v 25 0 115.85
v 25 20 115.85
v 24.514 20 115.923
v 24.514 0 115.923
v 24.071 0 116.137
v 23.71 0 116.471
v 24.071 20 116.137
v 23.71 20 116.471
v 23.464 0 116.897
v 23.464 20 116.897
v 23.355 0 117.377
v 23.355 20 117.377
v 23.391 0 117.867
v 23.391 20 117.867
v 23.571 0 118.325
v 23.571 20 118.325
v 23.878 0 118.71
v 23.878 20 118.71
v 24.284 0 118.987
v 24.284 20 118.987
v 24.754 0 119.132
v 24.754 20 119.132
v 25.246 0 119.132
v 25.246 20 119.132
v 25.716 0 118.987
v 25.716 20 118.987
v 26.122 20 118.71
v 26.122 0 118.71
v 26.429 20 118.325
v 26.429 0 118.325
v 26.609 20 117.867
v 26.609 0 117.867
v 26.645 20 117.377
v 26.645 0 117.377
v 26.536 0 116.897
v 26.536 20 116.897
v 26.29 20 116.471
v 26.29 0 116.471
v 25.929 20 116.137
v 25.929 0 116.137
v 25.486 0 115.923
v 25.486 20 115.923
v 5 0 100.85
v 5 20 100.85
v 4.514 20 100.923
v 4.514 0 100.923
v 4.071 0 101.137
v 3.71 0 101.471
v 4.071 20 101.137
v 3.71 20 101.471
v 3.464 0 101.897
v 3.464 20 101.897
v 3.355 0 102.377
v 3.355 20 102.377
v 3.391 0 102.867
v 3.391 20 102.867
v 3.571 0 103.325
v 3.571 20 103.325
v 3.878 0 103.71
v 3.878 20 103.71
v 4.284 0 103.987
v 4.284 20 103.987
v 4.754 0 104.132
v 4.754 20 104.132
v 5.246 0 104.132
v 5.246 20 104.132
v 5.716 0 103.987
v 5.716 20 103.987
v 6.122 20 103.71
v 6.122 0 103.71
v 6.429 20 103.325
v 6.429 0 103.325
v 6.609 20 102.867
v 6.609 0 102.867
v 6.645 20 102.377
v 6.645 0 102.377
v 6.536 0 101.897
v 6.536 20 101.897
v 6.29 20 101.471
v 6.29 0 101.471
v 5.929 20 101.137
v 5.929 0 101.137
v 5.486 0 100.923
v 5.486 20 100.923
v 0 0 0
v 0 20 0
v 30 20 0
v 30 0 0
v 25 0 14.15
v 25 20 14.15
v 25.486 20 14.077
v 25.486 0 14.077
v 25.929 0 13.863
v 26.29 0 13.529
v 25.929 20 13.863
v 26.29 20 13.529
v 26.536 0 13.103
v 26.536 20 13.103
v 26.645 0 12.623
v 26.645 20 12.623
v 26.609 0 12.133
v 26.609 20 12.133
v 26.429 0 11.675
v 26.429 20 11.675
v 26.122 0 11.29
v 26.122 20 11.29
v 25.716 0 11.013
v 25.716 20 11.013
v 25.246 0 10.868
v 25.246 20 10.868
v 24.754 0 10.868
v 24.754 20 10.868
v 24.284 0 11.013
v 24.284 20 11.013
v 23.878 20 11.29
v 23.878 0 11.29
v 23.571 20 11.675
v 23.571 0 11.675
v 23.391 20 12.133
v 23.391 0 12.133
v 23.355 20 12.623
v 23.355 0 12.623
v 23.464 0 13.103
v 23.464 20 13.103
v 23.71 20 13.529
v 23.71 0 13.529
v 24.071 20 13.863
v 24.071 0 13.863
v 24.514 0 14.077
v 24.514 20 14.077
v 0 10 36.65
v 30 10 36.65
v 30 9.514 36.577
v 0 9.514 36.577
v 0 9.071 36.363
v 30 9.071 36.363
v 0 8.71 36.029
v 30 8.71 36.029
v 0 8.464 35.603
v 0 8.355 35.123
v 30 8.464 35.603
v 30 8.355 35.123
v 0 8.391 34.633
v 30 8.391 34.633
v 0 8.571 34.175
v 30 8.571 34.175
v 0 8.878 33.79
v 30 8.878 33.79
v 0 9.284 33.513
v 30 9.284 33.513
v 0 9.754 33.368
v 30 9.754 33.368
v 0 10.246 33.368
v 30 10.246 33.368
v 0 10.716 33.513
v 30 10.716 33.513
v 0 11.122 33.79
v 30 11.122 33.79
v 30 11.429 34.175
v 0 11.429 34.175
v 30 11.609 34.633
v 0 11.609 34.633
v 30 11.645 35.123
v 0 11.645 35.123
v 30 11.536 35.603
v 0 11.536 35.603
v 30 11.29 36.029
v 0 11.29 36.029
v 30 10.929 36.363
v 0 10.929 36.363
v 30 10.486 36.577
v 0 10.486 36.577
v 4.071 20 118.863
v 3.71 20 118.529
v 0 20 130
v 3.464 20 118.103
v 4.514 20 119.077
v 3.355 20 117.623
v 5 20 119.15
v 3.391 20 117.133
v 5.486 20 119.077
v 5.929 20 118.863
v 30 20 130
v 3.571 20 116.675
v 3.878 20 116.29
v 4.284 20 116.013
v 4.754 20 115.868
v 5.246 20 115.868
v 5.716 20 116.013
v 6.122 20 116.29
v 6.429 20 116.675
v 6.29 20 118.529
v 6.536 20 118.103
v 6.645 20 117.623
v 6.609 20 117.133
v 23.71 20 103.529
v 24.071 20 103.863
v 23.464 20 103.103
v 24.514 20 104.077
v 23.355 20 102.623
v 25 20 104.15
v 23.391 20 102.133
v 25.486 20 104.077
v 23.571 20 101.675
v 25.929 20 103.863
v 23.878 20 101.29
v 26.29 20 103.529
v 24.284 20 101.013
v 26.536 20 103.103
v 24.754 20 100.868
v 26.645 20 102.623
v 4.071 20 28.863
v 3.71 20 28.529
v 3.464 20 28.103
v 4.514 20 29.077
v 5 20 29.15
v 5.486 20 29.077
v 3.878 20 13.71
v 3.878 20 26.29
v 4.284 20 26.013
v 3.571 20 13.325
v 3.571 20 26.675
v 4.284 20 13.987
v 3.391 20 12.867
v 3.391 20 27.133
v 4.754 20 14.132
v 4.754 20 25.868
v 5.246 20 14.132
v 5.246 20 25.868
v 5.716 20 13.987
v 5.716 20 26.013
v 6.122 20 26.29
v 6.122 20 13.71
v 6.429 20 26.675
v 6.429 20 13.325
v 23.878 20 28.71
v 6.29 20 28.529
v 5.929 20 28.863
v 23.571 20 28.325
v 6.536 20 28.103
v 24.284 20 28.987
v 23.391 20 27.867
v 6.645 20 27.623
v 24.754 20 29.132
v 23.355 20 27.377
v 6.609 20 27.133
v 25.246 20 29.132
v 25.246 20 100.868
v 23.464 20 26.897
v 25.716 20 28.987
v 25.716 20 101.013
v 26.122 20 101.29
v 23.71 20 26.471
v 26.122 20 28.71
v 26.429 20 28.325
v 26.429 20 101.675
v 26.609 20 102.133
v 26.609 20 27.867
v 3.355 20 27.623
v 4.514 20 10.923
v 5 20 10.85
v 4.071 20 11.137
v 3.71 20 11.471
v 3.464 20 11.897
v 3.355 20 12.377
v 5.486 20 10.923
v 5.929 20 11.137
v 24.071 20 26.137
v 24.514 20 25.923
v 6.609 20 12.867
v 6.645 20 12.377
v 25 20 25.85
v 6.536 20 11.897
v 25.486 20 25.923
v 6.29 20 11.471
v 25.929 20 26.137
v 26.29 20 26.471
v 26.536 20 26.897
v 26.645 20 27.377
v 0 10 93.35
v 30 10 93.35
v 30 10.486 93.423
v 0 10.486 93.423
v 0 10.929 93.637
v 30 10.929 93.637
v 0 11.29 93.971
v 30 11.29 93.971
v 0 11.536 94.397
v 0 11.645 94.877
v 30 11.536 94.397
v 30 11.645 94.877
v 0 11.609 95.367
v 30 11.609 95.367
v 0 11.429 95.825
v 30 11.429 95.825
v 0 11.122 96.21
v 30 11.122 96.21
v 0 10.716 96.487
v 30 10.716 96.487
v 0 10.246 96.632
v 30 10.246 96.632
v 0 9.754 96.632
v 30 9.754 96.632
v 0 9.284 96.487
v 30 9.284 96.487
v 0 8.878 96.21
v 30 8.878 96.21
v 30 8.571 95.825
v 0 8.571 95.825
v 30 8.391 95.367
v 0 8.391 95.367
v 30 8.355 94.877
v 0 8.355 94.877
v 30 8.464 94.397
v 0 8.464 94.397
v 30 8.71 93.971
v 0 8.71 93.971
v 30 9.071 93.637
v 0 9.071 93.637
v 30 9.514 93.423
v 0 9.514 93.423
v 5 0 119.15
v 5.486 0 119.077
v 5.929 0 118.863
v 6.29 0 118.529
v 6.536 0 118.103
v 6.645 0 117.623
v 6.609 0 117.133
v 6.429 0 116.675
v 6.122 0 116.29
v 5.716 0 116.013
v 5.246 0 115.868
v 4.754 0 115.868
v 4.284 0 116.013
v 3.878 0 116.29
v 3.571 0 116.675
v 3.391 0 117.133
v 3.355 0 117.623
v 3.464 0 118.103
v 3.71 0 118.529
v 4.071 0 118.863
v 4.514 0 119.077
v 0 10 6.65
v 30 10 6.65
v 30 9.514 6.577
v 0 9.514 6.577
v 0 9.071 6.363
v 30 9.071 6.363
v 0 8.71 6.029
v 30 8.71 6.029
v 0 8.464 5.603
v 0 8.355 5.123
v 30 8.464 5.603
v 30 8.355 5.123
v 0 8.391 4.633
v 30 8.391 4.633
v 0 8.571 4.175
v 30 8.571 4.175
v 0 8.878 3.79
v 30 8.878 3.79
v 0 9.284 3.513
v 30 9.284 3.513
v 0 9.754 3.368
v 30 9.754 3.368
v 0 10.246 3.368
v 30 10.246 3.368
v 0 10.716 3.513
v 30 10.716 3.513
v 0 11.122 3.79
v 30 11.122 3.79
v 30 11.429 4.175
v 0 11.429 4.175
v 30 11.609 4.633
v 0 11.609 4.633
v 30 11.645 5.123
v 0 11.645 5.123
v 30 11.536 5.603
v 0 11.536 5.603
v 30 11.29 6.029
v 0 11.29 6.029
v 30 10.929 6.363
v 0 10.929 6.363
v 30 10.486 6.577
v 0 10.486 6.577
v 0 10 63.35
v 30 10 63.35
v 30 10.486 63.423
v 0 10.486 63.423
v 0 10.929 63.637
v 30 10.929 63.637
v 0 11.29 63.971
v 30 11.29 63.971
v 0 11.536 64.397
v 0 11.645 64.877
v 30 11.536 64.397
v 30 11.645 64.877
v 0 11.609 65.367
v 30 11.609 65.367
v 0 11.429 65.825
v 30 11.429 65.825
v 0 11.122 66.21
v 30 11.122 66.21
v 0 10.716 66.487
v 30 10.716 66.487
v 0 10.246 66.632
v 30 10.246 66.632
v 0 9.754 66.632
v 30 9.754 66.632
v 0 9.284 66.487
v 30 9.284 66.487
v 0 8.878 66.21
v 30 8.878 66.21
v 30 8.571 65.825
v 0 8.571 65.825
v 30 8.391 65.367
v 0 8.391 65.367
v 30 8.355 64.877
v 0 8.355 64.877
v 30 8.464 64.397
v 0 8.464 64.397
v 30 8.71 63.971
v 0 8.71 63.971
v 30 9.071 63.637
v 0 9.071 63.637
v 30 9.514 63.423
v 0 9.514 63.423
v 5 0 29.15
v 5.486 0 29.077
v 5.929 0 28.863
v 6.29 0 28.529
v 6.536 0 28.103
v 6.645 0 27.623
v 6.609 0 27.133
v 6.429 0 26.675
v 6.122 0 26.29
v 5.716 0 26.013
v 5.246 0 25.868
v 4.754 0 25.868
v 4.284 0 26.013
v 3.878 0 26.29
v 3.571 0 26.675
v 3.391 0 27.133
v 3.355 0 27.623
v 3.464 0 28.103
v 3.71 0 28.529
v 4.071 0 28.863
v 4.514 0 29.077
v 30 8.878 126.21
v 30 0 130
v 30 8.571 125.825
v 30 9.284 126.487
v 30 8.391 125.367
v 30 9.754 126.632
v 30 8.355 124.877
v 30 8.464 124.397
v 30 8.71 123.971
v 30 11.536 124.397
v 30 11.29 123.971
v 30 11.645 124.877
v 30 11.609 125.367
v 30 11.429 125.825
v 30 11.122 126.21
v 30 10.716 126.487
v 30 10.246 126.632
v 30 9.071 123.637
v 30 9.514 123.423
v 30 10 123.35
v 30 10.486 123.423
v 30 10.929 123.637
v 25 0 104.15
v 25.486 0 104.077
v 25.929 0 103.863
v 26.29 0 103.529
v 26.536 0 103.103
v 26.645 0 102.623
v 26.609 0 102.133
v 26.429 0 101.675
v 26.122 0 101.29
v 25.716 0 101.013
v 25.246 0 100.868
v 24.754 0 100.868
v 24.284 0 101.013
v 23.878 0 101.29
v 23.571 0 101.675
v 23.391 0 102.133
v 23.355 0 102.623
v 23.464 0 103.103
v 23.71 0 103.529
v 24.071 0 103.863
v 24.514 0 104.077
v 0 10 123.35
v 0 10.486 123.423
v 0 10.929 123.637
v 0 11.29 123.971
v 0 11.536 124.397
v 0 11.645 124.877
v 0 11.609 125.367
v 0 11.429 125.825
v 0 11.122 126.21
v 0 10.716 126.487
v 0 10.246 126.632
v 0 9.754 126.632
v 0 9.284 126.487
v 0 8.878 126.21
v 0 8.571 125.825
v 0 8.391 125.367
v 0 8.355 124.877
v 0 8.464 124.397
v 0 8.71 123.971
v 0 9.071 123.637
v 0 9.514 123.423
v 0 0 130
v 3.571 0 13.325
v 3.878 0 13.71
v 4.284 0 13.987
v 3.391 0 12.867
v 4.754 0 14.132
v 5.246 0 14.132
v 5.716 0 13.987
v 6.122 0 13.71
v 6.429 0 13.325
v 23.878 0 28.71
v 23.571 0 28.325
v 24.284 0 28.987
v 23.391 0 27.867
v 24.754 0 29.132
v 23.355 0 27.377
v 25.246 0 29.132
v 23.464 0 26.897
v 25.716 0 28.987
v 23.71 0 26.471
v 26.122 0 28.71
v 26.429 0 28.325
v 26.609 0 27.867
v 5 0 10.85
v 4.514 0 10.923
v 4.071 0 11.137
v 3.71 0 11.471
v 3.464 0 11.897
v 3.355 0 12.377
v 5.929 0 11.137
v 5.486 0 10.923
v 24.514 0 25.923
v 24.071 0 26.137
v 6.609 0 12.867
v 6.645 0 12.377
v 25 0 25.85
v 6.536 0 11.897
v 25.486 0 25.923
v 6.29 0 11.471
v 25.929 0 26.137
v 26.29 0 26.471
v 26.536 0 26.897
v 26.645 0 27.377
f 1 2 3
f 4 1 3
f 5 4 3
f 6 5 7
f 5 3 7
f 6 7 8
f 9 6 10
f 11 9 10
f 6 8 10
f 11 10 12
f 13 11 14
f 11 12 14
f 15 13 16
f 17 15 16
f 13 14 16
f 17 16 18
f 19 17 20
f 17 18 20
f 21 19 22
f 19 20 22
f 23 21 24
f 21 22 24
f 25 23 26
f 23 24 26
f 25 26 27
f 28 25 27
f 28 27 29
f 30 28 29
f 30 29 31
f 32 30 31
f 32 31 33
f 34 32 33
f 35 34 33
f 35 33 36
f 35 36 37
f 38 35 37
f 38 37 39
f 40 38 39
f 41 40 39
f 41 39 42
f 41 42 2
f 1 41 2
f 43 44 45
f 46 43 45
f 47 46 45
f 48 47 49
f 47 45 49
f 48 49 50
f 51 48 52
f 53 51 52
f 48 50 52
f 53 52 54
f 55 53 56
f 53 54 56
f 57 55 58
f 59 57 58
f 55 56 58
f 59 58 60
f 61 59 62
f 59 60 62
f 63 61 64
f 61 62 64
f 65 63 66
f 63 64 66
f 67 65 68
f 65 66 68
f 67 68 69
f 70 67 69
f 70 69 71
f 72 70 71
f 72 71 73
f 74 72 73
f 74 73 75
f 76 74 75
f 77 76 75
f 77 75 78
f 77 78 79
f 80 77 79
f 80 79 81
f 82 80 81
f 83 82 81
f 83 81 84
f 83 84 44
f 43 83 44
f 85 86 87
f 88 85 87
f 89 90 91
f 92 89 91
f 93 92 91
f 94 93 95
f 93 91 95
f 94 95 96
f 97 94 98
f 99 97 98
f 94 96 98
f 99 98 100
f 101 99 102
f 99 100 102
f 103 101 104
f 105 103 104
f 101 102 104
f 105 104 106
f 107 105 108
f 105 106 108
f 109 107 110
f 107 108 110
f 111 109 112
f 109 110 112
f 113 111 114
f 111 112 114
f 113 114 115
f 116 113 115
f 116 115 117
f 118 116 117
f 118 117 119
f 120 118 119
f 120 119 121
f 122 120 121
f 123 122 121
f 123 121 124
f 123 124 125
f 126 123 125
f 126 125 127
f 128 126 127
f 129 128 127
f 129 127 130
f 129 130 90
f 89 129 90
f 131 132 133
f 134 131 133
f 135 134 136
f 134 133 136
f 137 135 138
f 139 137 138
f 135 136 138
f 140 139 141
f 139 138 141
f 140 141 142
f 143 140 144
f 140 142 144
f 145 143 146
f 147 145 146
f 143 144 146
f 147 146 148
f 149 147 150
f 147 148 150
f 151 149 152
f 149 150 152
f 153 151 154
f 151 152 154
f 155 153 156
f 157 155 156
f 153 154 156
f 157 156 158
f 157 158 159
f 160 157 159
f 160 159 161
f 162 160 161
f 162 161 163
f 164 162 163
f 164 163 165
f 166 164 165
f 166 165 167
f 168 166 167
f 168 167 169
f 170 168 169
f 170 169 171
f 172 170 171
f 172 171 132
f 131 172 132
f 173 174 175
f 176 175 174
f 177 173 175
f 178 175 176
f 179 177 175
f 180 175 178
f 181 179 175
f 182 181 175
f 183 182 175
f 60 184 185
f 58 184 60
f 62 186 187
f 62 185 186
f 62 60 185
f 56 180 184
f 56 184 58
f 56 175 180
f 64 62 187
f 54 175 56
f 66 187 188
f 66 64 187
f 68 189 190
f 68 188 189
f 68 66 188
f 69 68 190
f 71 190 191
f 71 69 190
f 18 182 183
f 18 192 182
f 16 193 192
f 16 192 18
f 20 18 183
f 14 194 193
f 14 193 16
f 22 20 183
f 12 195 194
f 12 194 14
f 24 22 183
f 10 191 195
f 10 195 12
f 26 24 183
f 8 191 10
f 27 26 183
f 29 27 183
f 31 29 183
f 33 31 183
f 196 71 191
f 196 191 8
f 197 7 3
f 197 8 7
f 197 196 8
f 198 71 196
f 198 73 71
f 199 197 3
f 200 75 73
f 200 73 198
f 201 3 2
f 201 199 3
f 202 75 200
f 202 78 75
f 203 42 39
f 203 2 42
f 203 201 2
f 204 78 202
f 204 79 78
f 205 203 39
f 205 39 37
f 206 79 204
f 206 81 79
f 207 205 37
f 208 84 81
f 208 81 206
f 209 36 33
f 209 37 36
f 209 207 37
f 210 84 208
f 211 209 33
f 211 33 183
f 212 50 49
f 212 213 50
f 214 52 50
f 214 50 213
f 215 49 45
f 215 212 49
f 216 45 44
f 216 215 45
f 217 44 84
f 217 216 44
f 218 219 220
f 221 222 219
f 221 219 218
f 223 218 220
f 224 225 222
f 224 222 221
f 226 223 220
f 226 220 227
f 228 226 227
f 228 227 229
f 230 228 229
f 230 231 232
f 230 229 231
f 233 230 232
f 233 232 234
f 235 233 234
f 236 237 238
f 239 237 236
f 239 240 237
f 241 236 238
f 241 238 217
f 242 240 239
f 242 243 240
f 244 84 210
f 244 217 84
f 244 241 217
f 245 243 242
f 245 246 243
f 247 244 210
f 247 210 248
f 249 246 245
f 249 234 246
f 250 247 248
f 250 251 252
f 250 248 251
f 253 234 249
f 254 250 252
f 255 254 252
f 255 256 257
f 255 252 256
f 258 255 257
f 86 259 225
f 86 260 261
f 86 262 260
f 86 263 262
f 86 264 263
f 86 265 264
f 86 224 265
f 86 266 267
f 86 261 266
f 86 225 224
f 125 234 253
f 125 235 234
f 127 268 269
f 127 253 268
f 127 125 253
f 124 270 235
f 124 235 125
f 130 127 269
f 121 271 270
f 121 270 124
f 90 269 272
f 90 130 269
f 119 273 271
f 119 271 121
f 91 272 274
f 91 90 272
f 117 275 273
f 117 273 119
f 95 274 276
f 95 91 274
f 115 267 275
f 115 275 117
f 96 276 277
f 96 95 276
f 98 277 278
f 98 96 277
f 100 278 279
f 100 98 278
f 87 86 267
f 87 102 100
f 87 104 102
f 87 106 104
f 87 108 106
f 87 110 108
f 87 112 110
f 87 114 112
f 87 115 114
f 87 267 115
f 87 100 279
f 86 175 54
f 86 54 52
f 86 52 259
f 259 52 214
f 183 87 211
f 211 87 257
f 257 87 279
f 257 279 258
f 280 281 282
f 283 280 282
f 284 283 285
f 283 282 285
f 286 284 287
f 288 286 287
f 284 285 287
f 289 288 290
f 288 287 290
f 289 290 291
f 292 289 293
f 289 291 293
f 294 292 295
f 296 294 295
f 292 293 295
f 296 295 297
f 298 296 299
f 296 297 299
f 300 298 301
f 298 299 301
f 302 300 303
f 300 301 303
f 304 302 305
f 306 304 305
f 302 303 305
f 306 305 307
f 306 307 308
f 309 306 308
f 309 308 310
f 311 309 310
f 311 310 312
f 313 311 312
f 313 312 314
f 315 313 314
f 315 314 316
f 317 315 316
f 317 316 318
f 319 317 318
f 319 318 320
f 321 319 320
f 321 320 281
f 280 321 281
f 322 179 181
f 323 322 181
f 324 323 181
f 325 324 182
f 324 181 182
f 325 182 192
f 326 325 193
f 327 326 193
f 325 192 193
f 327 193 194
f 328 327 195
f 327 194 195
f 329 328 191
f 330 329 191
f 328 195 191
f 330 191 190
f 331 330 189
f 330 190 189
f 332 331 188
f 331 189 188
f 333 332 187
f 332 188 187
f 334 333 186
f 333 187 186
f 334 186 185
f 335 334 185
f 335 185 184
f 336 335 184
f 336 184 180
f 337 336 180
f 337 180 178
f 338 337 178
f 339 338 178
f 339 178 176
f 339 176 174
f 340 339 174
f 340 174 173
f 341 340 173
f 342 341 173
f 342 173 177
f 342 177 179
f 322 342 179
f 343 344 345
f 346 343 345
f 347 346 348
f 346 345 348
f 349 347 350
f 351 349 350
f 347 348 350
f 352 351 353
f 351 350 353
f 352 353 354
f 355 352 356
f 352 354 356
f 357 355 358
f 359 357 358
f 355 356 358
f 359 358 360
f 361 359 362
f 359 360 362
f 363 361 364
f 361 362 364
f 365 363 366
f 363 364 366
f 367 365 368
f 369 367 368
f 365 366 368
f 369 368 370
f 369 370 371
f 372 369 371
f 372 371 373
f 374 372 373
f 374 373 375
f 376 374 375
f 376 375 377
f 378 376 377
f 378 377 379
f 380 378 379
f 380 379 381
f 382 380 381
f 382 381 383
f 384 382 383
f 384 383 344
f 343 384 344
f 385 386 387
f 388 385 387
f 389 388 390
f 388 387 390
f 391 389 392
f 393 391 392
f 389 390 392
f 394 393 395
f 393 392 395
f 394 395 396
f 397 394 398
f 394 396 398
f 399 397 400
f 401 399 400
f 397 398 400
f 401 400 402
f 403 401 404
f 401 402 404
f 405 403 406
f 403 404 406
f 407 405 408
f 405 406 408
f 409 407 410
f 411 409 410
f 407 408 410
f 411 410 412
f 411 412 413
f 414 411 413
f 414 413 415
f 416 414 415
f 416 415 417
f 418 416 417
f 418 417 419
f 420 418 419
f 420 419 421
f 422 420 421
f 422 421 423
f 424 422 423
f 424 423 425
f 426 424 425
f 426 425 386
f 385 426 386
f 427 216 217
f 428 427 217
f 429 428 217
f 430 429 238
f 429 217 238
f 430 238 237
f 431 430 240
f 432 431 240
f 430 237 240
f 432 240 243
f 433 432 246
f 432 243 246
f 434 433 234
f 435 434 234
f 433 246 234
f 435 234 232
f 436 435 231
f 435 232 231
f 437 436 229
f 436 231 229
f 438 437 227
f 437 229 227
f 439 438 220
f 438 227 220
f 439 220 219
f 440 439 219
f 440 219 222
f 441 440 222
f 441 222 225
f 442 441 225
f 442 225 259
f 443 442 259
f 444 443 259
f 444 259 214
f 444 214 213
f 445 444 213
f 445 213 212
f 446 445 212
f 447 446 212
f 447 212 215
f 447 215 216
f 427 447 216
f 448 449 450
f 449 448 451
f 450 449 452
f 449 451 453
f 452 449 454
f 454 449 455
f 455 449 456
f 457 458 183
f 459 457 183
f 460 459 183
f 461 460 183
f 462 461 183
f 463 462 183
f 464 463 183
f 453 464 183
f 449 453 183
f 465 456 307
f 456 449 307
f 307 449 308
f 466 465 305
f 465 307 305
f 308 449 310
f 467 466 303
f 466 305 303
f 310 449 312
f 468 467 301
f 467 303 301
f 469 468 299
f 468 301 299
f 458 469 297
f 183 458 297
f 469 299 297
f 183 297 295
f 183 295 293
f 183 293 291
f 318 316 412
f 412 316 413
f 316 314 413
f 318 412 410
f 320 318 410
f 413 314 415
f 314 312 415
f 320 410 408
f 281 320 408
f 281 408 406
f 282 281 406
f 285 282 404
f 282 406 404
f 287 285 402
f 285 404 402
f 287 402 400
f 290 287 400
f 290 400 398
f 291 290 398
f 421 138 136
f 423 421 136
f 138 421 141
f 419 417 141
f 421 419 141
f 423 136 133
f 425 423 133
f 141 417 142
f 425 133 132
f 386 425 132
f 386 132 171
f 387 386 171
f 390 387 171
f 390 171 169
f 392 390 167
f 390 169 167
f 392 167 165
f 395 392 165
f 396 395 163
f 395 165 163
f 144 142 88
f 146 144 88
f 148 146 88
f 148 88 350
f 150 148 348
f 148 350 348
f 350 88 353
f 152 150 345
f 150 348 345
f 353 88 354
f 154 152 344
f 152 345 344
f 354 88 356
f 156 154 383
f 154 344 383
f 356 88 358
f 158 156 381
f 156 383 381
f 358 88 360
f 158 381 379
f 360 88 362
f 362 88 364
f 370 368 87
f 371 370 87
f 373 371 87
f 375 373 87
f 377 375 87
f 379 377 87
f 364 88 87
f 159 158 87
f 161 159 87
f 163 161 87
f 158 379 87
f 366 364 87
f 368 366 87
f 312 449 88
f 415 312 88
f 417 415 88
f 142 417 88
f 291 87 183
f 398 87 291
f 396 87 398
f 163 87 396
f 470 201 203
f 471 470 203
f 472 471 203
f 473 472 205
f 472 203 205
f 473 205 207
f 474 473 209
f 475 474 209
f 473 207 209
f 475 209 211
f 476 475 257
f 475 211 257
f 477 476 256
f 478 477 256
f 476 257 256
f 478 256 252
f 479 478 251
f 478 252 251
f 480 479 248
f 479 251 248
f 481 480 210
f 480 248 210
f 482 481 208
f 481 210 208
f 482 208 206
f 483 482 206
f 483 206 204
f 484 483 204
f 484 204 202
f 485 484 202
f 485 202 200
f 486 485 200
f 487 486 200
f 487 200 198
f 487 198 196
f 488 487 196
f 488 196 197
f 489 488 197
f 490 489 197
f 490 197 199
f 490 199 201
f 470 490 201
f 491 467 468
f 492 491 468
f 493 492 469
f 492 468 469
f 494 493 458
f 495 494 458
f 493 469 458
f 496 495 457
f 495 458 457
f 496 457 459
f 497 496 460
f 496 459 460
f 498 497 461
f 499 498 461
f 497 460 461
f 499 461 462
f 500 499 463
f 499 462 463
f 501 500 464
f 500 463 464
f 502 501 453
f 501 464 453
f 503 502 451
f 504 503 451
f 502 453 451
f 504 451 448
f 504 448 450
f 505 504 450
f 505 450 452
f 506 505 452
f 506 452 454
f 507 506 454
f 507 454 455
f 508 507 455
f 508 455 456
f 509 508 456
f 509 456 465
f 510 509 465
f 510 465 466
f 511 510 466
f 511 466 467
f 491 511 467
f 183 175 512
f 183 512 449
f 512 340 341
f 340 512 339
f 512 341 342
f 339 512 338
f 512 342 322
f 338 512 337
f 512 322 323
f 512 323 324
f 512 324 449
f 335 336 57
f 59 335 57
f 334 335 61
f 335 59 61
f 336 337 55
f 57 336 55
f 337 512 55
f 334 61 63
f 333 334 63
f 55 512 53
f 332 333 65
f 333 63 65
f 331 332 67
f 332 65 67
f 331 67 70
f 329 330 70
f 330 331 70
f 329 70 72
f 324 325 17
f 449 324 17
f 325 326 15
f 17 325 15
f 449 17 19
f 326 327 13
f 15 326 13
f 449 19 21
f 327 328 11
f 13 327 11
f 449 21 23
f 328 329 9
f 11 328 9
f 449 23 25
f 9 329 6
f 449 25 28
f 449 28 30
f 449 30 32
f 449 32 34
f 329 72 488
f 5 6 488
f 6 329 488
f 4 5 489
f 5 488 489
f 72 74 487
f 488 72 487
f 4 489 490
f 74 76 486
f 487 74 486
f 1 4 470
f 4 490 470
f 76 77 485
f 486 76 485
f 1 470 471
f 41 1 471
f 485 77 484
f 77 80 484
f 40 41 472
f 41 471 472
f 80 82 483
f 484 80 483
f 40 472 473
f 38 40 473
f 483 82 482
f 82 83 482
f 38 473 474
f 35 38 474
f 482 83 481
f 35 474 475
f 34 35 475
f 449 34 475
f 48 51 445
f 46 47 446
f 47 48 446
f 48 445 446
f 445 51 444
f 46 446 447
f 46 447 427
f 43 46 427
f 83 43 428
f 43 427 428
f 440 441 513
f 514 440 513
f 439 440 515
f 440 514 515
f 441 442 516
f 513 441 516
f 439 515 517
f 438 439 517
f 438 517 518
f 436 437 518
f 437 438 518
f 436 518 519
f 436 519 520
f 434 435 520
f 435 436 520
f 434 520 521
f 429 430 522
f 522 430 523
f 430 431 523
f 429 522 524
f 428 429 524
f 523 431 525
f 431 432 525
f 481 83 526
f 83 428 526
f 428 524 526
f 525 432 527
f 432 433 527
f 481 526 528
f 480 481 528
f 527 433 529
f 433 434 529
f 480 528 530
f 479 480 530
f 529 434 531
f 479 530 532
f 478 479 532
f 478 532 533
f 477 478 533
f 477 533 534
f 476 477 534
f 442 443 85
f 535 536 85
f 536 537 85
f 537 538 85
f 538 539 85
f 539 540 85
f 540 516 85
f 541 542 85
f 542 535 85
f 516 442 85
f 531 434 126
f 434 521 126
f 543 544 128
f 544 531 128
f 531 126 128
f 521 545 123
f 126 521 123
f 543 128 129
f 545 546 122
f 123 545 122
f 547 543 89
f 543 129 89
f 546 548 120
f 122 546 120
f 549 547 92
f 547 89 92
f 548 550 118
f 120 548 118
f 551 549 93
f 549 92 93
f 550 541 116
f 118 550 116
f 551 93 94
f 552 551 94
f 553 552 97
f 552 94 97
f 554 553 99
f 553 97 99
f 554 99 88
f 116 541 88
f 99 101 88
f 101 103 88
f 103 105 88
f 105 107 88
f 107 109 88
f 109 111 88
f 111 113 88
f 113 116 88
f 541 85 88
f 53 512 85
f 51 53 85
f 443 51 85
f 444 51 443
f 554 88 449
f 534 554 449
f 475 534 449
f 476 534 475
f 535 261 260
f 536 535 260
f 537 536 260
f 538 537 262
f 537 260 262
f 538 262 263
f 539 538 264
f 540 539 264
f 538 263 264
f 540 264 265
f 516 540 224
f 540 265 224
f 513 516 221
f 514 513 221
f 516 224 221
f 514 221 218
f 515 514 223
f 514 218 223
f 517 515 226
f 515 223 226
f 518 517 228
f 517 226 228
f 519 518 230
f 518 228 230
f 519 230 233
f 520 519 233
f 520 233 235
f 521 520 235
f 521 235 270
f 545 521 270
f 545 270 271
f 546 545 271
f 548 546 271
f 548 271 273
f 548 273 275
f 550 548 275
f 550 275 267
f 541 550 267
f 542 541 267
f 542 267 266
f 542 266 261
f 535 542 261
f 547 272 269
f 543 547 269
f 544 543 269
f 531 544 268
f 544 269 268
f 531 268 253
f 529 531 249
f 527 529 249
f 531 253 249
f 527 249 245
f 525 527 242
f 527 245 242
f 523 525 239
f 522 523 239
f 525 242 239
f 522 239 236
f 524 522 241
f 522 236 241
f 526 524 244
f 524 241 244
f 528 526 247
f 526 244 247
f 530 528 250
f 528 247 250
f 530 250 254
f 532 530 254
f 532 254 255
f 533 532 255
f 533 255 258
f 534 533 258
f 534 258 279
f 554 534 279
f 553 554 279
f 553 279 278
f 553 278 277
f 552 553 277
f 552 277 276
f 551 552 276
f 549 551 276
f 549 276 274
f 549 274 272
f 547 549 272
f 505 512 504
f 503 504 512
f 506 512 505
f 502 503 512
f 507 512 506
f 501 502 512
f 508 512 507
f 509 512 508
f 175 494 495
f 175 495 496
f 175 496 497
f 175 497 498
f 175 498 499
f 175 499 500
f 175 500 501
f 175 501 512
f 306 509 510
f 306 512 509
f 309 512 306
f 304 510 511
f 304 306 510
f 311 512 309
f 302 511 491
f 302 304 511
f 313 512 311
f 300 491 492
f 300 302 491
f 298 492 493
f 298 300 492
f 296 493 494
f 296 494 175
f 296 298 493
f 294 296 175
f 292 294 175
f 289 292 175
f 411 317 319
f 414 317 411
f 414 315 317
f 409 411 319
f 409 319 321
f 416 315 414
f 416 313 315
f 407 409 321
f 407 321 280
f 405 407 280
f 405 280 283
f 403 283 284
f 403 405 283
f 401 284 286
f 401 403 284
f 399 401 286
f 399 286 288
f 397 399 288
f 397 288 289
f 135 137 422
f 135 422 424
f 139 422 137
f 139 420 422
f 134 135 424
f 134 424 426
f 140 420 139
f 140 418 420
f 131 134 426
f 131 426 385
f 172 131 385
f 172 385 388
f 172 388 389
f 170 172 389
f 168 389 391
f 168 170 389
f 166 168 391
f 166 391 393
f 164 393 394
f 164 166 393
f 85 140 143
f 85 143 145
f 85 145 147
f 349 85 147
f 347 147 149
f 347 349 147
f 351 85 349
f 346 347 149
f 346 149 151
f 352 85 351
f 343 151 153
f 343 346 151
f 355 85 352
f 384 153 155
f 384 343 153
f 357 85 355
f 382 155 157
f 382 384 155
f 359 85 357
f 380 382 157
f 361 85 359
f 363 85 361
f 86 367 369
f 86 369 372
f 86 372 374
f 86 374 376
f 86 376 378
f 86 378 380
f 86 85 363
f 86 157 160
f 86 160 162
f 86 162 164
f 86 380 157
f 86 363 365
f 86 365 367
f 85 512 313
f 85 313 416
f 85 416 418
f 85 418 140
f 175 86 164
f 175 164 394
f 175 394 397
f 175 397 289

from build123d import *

# Parameters (mm, degrees)
ESQUISSE1_W             = 30
ESQUISSE1_H             = 20
BOSS_EXTRU_1_DEPTH      = 130
ESQUISSE2_R             = 1.65
ENL_V_MAT_EXTRU_1_DEPTH = 135.907375632
ESQUISSE3_R             = 1.65
ENL_V_MAT_EXTRU_2_DEPTH = 135.907375632


with BuildPart() as part:
    # Esquisse1 → Boss.-Extru.1 (new body)
    with BuildSketch(Plane.XY):
        with Locations((15, 10)):
            Rectangle(ESQUISSE1_W, ESQUISSE1_H)
    extrude(amount=BOSS_EXTRU_1_DEPTH)

    # Esquisse2 → Enlèv. mat.-Extru.1 (cut, through all)
    with BuildSketch(Plane(origin=(0, 20, 0), x_dir=(1, 0, 0), z_dir=(0, 1, 0))):
        with Locations(Location((5, -117.5, 0), (0, 0, 270))):
            Circle(ESQUISSE2_R)
        with Locations(Location((5, -102.5, 0), (0, 0, 90))):
            Circle(ESQUISSE2_R)
        with Locations(Location((25, -102.5, 0), (0, 0, 270))):
            Circle(ESQUISSE2_R)
        with Locations(Location((25, -117.5, 0), (0, 0, 90))):
            Circle(ESQUISSE2_R)
        with Locations(Location((25, -12.5, 0), (0, 0, 270))):
            Circle(ESQUISSE2_R)
        with Locations(Location((25, -27.5, 0), (0, 0, 90))):
            Circle(ESQUISSE2_R)
        with Locations(Location((5, -27.5, 0), (0, 0, 270))):
            Circle(ESQUISSE2_R)
        with Locations(Location((5, -12.5, 0), (0, 0, 90))):
            Circle(ESQUISSE2_R)
    extrude(amount=-ENL_V_MAT_EXTRU_1_DEPTH, mode=Mode.SUBTRACT)

    # Esquisse3 → Enlèv. mat.-Extru.2 (cut, through all)
    with BuildSketch(Plane(origin=(30, 0, 0), x_dir=(0, 0, -1), z_dir=(1, 0, 0))):
        with Locations((-65, 10)):
            Circle(ESQUISSE3_R)
        with Locations((-95, 10)):
            Circle(ESQUISSE3_R)
        with Locations((-125, 10)):
            Circle(ESQUISSE3_R)
        with Locations(Location((-5, 10, 0), (0, 0, 180))):
            Circle(ESQUISSE3_R)
        with Locations(Location((-35, 10, 0), (0, 0, 180))):
            Circle(ESQUISSE3_R)
    extrude(amount=-ENL_V_MAT_EXTRU_2_DEPTH, mode=Mode.SUBTRACT)


solid = part.part
